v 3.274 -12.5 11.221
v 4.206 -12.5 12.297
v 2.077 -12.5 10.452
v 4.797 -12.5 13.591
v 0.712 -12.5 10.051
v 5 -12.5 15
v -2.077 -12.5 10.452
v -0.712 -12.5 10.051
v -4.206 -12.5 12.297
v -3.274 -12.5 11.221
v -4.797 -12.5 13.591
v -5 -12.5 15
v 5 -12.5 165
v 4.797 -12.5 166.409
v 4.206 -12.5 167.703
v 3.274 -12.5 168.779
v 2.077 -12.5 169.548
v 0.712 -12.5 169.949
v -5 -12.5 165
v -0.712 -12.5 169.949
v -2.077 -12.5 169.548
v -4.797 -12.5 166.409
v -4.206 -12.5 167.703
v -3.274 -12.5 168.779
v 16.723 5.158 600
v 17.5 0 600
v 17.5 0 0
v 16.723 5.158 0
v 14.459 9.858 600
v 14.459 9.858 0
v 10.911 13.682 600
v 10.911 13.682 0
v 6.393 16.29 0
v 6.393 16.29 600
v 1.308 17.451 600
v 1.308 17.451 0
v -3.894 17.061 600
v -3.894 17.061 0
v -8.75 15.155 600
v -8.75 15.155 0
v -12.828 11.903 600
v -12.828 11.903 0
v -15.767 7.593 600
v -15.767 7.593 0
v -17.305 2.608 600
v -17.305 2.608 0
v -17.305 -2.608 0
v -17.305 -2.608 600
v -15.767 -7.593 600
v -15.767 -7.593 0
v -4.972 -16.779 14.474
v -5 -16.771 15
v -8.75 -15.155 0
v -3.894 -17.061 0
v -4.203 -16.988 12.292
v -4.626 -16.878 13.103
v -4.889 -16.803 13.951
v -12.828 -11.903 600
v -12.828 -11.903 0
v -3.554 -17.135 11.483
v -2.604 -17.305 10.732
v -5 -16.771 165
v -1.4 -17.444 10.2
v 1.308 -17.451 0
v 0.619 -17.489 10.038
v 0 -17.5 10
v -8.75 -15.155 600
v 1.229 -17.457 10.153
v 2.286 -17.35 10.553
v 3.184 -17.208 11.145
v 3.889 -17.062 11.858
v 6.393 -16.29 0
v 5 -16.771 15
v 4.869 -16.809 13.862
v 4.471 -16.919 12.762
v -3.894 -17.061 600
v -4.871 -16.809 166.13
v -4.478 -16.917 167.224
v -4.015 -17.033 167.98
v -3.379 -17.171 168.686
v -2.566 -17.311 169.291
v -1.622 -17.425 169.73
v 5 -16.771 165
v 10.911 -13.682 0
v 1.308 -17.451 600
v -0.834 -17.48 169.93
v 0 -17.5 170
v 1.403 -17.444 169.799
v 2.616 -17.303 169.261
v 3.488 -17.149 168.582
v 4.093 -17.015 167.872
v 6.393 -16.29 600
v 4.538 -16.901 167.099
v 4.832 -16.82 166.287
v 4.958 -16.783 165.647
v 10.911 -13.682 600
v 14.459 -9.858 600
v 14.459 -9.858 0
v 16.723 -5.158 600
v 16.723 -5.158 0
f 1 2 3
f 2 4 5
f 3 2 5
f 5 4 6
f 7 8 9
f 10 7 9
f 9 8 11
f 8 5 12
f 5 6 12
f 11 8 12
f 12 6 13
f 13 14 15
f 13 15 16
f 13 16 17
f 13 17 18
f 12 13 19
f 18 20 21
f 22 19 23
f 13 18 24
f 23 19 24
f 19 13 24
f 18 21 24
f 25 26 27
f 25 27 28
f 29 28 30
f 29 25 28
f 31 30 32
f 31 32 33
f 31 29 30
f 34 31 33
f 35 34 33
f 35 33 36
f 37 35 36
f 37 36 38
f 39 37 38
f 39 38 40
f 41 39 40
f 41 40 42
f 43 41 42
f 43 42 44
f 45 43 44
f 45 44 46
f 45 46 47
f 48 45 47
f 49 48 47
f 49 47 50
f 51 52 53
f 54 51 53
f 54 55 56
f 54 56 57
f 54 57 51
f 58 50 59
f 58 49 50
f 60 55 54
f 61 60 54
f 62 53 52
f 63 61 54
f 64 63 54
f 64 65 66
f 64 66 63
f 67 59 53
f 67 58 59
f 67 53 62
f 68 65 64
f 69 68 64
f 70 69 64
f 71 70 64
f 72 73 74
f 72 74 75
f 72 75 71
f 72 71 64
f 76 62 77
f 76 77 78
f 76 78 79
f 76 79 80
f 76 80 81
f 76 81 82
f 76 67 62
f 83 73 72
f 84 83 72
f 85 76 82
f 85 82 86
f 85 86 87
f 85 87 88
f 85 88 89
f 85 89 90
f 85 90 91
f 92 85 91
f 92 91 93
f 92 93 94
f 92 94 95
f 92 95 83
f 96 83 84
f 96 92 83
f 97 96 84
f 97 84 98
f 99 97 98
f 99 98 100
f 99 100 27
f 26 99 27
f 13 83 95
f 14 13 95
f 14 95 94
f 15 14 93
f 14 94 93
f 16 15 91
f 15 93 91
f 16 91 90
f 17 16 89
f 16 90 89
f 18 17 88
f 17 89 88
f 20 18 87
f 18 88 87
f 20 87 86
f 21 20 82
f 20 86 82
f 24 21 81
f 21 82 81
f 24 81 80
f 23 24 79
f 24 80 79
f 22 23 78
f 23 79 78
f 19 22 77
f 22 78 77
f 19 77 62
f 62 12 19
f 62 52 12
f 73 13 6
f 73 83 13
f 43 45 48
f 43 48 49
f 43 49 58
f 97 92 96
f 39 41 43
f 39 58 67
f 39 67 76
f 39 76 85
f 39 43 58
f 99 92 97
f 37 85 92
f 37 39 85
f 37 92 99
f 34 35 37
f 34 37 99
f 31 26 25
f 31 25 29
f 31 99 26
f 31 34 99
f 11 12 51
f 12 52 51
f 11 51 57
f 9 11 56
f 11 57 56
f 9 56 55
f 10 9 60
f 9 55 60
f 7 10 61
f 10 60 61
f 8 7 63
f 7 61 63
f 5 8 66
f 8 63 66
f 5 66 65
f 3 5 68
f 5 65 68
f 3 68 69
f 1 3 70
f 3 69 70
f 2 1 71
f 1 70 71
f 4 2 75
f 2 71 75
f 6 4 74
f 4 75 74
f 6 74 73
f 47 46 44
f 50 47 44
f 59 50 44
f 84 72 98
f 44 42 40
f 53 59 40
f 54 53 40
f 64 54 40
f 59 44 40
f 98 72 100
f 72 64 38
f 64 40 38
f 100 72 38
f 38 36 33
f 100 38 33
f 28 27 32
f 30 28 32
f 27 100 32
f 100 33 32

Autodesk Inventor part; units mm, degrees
ref_plane "YZ Plane" through (0, 0, 0) normal (1, 0, 0) x (0, 1, 0)
ref_plane "XY Plane" through (0, 0, 0) normal (0, 0, 1) x (1, 0, 0)
sketch "Sketch1" plane through (0, 0, 0) normal (0, 1, 0) x (-1, 0, 0)
  line L0 (0, 0) -> (0, 600)
  line L1 (0, 0) -> (-17.5, 0)
  line L2 (-17.5, 0) -> (-17.5, 600)
  line L3 (-17.5, 600) -> (0, 600)
  line L4 (-17.5, 200) -> (-18, 200)
  line L5 (-18, 200) -> (-18, 350)
  line L6 (-18, 350) -> (-17.5, 350)
  dimension "d5" = 35
  dimension "d6" = 36
  dimension "d7" = 600
  dimension "d8" = 250
  dimension "d9" = 200
revolve "Revolution1" add sketch "Sketch1" angle 360 about axis through (0, 0, 0) along (0, 0, 1) contours L1 L2 L3 L0
ref_plane "Work Plane2" through (0, -17.5, 300) normal (0, 1, 0) x (-1, 0, 0)
sketch "Sketch2" plane through (0, -17.5, 300) normal (0, 1, 0) x (-1, 0, 0)
  line L0 (0, -135) -> (0, -285) construction
  line L1 (-5, -135) -> (-5, -285)
  line L2 (5, -285) -> (5, -135)
  arc A0 (5, -135) -> (-5, -135) centre (0, -135) ccw
  arc A1 (-5, -285) -> (5, -285) centre (0, -285) ccw
  point P0 (0, -300)
  point P1 (0, -210)
  point P2 (0, -290)
  dimension "d10" = 10
  dimension "d11" = 150
  dimension "d12" = 10
extrude "Extrusion1" cut sketch "Sketch2" along normal blind 5
properties part number "Вал ведущей шестерни"
